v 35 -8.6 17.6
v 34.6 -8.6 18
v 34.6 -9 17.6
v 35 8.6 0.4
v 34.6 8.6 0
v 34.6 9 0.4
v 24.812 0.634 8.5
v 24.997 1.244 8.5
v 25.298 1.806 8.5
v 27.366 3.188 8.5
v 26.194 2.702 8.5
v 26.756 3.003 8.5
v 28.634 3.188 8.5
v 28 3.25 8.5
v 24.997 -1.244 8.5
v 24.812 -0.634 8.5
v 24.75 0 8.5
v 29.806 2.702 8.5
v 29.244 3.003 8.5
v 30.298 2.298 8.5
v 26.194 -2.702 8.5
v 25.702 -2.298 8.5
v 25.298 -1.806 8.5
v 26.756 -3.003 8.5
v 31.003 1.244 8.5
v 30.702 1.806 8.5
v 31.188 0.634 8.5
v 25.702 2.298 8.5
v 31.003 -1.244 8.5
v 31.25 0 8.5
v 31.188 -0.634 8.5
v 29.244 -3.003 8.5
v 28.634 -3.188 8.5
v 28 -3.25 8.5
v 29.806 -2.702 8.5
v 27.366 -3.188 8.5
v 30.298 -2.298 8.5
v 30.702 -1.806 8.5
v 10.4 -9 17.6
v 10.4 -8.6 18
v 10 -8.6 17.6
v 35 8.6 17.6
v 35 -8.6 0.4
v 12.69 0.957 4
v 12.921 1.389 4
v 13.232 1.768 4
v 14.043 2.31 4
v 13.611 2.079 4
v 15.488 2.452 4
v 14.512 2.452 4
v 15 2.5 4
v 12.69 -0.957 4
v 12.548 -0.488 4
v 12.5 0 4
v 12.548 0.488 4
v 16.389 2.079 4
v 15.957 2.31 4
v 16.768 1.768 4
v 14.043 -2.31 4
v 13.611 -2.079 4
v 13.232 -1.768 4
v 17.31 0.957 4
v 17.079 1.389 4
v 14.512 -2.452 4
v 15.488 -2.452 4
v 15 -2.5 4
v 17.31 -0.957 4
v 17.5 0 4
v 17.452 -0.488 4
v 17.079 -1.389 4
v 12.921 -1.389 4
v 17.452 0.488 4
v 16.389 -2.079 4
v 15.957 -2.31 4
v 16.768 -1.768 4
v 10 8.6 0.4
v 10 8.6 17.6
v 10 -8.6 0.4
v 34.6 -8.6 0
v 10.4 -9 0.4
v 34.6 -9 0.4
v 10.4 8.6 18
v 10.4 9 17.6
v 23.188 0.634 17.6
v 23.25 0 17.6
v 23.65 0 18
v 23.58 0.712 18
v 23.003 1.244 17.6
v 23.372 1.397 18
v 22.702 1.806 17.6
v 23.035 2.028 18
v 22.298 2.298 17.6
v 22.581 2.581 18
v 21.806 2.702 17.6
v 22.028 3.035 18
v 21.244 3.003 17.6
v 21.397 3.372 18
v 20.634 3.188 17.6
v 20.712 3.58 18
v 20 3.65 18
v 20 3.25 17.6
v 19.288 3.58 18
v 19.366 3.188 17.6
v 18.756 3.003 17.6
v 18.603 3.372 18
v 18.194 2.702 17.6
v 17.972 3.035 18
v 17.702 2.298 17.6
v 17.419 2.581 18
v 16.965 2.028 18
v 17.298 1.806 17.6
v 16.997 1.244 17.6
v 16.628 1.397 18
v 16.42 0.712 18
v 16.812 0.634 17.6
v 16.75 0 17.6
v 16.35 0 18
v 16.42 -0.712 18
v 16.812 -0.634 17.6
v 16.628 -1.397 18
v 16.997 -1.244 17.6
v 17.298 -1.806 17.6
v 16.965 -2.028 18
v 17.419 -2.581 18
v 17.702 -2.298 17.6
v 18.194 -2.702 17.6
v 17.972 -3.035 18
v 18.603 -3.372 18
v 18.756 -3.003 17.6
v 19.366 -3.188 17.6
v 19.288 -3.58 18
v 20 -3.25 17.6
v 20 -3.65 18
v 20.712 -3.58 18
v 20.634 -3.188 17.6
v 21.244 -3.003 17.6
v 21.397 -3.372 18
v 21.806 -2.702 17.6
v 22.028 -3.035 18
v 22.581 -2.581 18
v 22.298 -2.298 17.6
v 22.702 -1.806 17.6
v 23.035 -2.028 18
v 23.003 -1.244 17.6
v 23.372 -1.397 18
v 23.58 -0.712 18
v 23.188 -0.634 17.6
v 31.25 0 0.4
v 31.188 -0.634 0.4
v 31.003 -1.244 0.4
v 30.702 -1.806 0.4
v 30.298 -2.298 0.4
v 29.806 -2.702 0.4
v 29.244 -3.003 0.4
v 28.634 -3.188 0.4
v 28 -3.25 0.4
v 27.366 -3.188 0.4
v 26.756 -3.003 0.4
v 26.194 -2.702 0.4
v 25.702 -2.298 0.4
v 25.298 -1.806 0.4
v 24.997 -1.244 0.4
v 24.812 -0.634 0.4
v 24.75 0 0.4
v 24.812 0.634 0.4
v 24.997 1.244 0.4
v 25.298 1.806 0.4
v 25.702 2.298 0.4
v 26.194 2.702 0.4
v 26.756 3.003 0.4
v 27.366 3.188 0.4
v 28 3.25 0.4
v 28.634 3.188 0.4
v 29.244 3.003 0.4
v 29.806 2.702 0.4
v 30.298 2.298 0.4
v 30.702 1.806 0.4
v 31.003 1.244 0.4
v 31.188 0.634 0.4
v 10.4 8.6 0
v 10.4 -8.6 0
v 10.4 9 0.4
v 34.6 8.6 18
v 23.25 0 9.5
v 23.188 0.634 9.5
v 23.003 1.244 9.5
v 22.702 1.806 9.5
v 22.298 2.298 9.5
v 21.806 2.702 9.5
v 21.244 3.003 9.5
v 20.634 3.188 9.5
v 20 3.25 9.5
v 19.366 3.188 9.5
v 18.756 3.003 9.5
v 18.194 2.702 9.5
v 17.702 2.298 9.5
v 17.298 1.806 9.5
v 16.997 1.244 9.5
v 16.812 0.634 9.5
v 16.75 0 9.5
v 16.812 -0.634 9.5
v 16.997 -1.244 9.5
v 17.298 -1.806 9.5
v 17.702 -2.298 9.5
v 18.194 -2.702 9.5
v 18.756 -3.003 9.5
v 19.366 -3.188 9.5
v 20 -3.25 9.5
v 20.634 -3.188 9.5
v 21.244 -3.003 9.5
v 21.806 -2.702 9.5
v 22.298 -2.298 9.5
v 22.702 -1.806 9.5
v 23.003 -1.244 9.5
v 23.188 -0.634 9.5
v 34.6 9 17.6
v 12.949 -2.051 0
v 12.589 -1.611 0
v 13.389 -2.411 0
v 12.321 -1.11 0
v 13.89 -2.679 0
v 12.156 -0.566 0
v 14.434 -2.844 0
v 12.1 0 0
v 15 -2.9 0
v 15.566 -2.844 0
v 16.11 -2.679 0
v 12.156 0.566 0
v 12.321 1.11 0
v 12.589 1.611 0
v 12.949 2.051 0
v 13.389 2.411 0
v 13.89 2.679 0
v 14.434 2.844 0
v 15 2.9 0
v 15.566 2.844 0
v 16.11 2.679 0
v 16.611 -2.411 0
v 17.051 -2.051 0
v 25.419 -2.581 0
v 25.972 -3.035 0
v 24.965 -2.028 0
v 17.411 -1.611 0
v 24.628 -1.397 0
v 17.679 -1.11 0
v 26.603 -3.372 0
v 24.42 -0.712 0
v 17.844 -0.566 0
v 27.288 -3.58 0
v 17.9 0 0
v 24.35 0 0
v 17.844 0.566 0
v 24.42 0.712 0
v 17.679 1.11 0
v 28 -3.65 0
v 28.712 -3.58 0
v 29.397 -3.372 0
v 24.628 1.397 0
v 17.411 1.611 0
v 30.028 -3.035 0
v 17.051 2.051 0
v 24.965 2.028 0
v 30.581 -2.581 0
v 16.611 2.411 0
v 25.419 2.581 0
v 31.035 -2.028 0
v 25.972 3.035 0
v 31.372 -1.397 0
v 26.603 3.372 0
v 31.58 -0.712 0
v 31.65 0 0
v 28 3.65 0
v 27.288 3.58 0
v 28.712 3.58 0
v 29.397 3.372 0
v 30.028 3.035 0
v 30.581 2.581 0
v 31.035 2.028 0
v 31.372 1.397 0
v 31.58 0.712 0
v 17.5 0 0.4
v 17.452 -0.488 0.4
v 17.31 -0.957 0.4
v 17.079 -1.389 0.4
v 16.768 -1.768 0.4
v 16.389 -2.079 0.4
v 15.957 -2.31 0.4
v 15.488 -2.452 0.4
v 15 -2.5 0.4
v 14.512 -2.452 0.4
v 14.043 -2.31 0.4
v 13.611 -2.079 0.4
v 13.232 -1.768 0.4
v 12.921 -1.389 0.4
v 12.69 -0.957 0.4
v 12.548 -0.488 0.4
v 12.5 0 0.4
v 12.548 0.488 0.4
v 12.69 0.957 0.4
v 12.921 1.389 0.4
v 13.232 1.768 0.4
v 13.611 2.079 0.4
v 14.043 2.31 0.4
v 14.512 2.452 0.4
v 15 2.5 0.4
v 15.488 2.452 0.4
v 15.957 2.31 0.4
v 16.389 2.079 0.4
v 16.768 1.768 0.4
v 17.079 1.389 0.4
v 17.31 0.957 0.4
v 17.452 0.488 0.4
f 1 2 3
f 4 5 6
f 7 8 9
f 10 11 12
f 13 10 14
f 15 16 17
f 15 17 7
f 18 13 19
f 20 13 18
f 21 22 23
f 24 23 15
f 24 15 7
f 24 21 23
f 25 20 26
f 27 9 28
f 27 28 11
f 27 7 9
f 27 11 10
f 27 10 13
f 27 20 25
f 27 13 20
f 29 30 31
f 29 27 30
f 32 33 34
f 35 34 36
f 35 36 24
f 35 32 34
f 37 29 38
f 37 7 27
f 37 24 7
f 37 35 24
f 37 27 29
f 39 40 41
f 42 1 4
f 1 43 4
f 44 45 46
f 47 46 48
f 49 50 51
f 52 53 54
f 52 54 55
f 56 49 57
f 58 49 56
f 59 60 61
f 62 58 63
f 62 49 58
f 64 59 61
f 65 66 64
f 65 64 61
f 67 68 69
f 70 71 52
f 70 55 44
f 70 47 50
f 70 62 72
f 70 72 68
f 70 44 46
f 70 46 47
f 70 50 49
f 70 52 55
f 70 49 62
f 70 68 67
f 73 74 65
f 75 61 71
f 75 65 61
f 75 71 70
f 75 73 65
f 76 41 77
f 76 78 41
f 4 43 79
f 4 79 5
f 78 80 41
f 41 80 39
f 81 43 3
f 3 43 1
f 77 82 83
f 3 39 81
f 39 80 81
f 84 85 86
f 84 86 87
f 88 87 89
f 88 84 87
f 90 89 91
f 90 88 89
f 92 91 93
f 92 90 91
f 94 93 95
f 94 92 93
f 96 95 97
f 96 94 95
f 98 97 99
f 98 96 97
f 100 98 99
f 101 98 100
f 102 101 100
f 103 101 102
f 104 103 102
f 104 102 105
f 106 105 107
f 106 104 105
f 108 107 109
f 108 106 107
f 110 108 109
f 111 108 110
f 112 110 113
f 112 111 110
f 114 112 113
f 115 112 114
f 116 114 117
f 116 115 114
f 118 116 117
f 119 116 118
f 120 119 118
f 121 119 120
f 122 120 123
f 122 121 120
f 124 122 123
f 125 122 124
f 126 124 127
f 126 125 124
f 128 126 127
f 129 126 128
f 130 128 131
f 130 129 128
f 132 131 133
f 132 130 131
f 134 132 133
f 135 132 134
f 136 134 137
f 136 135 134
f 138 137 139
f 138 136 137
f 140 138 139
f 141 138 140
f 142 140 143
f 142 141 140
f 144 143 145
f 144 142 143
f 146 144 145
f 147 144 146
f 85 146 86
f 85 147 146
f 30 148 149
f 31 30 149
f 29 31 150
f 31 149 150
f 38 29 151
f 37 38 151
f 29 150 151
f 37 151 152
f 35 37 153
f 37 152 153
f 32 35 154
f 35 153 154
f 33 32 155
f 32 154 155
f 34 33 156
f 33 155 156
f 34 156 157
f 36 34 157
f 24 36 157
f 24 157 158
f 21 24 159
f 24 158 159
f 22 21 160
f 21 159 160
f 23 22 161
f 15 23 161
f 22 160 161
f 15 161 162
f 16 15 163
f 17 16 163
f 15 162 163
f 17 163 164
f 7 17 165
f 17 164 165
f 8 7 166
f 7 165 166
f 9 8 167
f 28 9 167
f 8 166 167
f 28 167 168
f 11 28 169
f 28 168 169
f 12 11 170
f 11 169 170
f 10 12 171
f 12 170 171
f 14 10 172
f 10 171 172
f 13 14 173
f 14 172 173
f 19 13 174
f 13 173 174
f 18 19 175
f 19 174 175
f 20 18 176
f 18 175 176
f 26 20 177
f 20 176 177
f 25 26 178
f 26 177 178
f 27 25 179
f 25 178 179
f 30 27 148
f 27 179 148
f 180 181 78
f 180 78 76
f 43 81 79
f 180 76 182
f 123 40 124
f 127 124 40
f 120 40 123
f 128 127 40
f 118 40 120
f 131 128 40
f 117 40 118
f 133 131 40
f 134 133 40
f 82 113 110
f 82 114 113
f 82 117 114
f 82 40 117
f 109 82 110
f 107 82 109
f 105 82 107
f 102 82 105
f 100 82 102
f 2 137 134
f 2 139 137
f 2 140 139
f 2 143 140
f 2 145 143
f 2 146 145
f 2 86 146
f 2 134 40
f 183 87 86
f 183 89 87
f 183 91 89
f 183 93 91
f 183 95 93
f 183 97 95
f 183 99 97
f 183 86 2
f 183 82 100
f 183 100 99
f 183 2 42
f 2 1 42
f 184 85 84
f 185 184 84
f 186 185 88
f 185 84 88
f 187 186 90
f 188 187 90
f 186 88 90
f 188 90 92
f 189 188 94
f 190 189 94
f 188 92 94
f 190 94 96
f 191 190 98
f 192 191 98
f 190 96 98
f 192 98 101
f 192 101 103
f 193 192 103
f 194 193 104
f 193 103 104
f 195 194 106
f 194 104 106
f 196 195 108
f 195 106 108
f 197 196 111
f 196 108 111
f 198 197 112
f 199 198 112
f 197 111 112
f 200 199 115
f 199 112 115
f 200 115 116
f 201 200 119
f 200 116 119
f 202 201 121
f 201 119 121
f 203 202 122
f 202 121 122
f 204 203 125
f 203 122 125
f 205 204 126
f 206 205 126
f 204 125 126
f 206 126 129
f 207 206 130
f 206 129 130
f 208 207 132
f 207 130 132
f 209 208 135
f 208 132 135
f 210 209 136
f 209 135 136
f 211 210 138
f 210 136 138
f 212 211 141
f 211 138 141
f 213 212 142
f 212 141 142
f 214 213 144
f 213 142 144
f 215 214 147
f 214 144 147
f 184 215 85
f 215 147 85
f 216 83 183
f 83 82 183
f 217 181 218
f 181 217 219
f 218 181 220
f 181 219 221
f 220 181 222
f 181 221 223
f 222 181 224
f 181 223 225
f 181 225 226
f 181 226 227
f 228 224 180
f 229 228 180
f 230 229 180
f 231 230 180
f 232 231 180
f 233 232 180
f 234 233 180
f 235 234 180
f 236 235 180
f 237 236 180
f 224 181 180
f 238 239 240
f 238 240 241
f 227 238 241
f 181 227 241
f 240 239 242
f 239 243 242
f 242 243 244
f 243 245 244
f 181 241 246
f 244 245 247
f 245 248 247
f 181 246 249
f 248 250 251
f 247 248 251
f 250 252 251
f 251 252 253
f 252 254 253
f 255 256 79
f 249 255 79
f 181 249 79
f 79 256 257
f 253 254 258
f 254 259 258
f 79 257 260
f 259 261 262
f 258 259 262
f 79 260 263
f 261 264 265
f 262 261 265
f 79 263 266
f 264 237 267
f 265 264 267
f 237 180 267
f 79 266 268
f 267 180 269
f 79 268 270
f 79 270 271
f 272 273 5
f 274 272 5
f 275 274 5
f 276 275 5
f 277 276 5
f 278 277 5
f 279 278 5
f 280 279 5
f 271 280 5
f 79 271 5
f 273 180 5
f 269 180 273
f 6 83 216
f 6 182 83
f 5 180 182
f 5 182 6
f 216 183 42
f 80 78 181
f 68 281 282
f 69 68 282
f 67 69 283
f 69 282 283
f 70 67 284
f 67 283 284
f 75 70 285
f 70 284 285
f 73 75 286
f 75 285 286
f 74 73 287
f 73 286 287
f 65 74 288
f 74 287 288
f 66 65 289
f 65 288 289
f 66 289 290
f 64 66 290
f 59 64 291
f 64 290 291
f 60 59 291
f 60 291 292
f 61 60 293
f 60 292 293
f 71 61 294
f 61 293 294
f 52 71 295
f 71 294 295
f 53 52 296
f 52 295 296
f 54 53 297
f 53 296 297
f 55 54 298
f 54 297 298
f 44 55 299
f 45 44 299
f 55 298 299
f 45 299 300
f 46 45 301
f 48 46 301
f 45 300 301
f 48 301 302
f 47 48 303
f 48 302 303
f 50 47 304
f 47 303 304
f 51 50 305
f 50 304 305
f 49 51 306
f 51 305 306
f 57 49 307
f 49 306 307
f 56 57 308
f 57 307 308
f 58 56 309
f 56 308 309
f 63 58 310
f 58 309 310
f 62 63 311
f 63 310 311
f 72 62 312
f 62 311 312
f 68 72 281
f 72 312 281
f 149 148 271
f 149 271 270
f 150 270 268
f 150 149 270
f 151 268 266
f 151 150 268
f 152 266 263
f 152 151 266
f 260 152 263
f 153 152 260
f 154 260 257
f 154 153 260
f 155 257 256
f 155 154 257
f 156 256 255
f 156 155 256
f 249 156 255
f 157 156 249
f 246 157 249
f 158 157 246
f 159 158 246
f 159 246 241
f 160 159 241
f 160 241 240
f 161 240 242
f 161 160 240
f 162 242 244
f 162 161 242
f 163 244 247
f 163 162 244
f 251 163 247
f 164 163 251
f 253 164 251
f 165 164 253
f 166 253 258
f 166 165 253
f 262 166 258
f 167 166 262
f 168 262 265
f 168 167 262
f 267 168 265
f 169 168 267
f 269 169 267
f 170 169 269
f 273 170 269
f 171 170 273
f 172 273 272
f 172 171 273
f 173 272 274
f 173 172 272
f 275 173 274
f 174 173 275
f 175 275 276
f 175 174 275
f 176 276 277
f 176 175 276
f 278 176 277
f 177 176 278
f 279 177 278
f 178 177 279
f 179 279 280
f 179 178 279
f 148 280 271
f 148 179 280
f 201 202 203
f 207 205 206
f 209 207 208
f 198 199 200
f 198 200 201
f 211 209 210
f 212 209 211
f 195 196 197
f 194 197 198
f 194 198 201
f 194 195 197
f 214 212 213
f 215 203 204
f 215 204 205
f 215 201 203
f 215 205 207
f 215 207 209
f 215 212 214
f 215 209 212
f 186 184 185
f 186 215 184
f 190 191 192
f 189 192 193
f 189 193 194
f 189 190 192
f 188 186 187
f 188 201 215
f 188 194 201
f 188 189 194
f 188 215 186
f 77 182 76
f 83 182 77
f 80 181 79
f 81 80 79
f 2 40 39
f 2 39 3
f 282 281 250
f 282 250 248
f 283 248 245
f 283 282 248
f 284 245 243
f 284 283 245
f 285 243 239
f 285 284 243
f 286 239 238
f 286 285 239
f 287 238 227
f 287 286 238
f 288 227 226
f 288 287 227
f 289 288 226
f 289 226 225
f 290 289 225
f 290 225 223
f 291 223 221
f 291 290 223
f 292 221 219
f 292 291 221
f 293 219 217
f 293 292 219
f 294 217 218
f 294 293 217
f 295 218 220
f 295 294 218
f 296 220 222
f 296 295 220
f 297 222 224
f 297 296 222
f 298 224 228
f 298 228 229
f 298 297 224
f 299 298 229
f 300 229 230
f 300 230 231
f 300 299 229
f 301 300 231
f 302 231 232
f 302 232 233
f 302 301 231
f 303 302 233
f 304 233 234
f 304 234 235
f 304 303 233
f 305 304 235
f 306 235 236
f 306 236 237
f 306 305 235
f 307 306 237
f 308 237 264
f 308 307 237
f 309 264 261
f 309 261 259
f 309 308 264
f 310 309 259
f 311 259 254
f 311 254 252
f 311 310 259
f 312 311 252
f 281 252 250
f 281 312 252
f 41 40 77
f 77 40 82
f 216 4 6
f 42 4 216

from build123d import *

# Parameters (mm, degrees)
SKETCH_W        = 25
SKETCH_H        = 18
PAD_DEPTH       = 18
SKETCH001_R     = 2.5
POCKET_DEPTH    = 4
SKETCH002_R     = 3.25
POCKET001_DEPTH = 8.5
SKETCH003_R     = 3.25
POCKET002_DEPTH = 8.5
CHAMFER_SIZE    = 0.4


with BuildPart() as part:
    # Sketch → Pad (new body)
    with BuildSketch(Plane.XY):
        with Locations((22.5, 0)):
            Rectangle(SKETCH_W, SKETCH_H)
    extrude(amount=PAD_DEPTH)

    # Sketch001 (on Face5 of Pad) → Pocket (cut)
    with BuildSketch(Plane(origin=(0, 0, 0), x_dir=(1, 0, 0), z_dir=(0, 0, -1))):
        with Locations((15, 0)):
            Circle(SKETCH001_R)
    extrude(amount=-POCKET_DEPTH, mode=Mode.SUBTRACT)

    # Sketch002 (on Face4 of Pocket) → Pocket001 (cut)
    with BuildSketch(Plane(origin=(0, 0, 0), x_dir=(1, 0, 0), z_dir=(0, 0, -1))):
        with Locations((28, 0)):
            Circle(SKETCH002_R)
    extrude(amount=-POCKET001_DEPTH, mode=Mode.SUBTRACT)

    # Sketch003 (on Face5 of Pocket001) → Pocket002 (cut)
    with BuildSketch(Plane.XY.offset(18)):
        with Locations((20, 0)):
            Circle(SKETCH003_R)
    extrude(amount=-POCKET002_DEPTH, mode=Mode.SUBTRACT)

    # Chamfer
    chamfer_edges = [part.edges().sort_by_distance(p)[0] for p in [
        (22.5, 9, 18),
        (10, 0, 18),
        (35, 0, 18),
        (22.5, -9, 18),
        (16.75, 0, 18),
        (10, -9, 9),
        (10, 9, 9),
        (10, 0, 0),
        (35, -9, 9),
        (22.5, -9, 0),
        (22.5, 9, 0),
        (35, 0, 0),
        (24.75, 0, 0),
        (12.5, 0, 0),
        (35, 9, 9),
    ]]
    chamfer(chamfer_edges, length=CHAMFER_SIZE)


solid = part.part
